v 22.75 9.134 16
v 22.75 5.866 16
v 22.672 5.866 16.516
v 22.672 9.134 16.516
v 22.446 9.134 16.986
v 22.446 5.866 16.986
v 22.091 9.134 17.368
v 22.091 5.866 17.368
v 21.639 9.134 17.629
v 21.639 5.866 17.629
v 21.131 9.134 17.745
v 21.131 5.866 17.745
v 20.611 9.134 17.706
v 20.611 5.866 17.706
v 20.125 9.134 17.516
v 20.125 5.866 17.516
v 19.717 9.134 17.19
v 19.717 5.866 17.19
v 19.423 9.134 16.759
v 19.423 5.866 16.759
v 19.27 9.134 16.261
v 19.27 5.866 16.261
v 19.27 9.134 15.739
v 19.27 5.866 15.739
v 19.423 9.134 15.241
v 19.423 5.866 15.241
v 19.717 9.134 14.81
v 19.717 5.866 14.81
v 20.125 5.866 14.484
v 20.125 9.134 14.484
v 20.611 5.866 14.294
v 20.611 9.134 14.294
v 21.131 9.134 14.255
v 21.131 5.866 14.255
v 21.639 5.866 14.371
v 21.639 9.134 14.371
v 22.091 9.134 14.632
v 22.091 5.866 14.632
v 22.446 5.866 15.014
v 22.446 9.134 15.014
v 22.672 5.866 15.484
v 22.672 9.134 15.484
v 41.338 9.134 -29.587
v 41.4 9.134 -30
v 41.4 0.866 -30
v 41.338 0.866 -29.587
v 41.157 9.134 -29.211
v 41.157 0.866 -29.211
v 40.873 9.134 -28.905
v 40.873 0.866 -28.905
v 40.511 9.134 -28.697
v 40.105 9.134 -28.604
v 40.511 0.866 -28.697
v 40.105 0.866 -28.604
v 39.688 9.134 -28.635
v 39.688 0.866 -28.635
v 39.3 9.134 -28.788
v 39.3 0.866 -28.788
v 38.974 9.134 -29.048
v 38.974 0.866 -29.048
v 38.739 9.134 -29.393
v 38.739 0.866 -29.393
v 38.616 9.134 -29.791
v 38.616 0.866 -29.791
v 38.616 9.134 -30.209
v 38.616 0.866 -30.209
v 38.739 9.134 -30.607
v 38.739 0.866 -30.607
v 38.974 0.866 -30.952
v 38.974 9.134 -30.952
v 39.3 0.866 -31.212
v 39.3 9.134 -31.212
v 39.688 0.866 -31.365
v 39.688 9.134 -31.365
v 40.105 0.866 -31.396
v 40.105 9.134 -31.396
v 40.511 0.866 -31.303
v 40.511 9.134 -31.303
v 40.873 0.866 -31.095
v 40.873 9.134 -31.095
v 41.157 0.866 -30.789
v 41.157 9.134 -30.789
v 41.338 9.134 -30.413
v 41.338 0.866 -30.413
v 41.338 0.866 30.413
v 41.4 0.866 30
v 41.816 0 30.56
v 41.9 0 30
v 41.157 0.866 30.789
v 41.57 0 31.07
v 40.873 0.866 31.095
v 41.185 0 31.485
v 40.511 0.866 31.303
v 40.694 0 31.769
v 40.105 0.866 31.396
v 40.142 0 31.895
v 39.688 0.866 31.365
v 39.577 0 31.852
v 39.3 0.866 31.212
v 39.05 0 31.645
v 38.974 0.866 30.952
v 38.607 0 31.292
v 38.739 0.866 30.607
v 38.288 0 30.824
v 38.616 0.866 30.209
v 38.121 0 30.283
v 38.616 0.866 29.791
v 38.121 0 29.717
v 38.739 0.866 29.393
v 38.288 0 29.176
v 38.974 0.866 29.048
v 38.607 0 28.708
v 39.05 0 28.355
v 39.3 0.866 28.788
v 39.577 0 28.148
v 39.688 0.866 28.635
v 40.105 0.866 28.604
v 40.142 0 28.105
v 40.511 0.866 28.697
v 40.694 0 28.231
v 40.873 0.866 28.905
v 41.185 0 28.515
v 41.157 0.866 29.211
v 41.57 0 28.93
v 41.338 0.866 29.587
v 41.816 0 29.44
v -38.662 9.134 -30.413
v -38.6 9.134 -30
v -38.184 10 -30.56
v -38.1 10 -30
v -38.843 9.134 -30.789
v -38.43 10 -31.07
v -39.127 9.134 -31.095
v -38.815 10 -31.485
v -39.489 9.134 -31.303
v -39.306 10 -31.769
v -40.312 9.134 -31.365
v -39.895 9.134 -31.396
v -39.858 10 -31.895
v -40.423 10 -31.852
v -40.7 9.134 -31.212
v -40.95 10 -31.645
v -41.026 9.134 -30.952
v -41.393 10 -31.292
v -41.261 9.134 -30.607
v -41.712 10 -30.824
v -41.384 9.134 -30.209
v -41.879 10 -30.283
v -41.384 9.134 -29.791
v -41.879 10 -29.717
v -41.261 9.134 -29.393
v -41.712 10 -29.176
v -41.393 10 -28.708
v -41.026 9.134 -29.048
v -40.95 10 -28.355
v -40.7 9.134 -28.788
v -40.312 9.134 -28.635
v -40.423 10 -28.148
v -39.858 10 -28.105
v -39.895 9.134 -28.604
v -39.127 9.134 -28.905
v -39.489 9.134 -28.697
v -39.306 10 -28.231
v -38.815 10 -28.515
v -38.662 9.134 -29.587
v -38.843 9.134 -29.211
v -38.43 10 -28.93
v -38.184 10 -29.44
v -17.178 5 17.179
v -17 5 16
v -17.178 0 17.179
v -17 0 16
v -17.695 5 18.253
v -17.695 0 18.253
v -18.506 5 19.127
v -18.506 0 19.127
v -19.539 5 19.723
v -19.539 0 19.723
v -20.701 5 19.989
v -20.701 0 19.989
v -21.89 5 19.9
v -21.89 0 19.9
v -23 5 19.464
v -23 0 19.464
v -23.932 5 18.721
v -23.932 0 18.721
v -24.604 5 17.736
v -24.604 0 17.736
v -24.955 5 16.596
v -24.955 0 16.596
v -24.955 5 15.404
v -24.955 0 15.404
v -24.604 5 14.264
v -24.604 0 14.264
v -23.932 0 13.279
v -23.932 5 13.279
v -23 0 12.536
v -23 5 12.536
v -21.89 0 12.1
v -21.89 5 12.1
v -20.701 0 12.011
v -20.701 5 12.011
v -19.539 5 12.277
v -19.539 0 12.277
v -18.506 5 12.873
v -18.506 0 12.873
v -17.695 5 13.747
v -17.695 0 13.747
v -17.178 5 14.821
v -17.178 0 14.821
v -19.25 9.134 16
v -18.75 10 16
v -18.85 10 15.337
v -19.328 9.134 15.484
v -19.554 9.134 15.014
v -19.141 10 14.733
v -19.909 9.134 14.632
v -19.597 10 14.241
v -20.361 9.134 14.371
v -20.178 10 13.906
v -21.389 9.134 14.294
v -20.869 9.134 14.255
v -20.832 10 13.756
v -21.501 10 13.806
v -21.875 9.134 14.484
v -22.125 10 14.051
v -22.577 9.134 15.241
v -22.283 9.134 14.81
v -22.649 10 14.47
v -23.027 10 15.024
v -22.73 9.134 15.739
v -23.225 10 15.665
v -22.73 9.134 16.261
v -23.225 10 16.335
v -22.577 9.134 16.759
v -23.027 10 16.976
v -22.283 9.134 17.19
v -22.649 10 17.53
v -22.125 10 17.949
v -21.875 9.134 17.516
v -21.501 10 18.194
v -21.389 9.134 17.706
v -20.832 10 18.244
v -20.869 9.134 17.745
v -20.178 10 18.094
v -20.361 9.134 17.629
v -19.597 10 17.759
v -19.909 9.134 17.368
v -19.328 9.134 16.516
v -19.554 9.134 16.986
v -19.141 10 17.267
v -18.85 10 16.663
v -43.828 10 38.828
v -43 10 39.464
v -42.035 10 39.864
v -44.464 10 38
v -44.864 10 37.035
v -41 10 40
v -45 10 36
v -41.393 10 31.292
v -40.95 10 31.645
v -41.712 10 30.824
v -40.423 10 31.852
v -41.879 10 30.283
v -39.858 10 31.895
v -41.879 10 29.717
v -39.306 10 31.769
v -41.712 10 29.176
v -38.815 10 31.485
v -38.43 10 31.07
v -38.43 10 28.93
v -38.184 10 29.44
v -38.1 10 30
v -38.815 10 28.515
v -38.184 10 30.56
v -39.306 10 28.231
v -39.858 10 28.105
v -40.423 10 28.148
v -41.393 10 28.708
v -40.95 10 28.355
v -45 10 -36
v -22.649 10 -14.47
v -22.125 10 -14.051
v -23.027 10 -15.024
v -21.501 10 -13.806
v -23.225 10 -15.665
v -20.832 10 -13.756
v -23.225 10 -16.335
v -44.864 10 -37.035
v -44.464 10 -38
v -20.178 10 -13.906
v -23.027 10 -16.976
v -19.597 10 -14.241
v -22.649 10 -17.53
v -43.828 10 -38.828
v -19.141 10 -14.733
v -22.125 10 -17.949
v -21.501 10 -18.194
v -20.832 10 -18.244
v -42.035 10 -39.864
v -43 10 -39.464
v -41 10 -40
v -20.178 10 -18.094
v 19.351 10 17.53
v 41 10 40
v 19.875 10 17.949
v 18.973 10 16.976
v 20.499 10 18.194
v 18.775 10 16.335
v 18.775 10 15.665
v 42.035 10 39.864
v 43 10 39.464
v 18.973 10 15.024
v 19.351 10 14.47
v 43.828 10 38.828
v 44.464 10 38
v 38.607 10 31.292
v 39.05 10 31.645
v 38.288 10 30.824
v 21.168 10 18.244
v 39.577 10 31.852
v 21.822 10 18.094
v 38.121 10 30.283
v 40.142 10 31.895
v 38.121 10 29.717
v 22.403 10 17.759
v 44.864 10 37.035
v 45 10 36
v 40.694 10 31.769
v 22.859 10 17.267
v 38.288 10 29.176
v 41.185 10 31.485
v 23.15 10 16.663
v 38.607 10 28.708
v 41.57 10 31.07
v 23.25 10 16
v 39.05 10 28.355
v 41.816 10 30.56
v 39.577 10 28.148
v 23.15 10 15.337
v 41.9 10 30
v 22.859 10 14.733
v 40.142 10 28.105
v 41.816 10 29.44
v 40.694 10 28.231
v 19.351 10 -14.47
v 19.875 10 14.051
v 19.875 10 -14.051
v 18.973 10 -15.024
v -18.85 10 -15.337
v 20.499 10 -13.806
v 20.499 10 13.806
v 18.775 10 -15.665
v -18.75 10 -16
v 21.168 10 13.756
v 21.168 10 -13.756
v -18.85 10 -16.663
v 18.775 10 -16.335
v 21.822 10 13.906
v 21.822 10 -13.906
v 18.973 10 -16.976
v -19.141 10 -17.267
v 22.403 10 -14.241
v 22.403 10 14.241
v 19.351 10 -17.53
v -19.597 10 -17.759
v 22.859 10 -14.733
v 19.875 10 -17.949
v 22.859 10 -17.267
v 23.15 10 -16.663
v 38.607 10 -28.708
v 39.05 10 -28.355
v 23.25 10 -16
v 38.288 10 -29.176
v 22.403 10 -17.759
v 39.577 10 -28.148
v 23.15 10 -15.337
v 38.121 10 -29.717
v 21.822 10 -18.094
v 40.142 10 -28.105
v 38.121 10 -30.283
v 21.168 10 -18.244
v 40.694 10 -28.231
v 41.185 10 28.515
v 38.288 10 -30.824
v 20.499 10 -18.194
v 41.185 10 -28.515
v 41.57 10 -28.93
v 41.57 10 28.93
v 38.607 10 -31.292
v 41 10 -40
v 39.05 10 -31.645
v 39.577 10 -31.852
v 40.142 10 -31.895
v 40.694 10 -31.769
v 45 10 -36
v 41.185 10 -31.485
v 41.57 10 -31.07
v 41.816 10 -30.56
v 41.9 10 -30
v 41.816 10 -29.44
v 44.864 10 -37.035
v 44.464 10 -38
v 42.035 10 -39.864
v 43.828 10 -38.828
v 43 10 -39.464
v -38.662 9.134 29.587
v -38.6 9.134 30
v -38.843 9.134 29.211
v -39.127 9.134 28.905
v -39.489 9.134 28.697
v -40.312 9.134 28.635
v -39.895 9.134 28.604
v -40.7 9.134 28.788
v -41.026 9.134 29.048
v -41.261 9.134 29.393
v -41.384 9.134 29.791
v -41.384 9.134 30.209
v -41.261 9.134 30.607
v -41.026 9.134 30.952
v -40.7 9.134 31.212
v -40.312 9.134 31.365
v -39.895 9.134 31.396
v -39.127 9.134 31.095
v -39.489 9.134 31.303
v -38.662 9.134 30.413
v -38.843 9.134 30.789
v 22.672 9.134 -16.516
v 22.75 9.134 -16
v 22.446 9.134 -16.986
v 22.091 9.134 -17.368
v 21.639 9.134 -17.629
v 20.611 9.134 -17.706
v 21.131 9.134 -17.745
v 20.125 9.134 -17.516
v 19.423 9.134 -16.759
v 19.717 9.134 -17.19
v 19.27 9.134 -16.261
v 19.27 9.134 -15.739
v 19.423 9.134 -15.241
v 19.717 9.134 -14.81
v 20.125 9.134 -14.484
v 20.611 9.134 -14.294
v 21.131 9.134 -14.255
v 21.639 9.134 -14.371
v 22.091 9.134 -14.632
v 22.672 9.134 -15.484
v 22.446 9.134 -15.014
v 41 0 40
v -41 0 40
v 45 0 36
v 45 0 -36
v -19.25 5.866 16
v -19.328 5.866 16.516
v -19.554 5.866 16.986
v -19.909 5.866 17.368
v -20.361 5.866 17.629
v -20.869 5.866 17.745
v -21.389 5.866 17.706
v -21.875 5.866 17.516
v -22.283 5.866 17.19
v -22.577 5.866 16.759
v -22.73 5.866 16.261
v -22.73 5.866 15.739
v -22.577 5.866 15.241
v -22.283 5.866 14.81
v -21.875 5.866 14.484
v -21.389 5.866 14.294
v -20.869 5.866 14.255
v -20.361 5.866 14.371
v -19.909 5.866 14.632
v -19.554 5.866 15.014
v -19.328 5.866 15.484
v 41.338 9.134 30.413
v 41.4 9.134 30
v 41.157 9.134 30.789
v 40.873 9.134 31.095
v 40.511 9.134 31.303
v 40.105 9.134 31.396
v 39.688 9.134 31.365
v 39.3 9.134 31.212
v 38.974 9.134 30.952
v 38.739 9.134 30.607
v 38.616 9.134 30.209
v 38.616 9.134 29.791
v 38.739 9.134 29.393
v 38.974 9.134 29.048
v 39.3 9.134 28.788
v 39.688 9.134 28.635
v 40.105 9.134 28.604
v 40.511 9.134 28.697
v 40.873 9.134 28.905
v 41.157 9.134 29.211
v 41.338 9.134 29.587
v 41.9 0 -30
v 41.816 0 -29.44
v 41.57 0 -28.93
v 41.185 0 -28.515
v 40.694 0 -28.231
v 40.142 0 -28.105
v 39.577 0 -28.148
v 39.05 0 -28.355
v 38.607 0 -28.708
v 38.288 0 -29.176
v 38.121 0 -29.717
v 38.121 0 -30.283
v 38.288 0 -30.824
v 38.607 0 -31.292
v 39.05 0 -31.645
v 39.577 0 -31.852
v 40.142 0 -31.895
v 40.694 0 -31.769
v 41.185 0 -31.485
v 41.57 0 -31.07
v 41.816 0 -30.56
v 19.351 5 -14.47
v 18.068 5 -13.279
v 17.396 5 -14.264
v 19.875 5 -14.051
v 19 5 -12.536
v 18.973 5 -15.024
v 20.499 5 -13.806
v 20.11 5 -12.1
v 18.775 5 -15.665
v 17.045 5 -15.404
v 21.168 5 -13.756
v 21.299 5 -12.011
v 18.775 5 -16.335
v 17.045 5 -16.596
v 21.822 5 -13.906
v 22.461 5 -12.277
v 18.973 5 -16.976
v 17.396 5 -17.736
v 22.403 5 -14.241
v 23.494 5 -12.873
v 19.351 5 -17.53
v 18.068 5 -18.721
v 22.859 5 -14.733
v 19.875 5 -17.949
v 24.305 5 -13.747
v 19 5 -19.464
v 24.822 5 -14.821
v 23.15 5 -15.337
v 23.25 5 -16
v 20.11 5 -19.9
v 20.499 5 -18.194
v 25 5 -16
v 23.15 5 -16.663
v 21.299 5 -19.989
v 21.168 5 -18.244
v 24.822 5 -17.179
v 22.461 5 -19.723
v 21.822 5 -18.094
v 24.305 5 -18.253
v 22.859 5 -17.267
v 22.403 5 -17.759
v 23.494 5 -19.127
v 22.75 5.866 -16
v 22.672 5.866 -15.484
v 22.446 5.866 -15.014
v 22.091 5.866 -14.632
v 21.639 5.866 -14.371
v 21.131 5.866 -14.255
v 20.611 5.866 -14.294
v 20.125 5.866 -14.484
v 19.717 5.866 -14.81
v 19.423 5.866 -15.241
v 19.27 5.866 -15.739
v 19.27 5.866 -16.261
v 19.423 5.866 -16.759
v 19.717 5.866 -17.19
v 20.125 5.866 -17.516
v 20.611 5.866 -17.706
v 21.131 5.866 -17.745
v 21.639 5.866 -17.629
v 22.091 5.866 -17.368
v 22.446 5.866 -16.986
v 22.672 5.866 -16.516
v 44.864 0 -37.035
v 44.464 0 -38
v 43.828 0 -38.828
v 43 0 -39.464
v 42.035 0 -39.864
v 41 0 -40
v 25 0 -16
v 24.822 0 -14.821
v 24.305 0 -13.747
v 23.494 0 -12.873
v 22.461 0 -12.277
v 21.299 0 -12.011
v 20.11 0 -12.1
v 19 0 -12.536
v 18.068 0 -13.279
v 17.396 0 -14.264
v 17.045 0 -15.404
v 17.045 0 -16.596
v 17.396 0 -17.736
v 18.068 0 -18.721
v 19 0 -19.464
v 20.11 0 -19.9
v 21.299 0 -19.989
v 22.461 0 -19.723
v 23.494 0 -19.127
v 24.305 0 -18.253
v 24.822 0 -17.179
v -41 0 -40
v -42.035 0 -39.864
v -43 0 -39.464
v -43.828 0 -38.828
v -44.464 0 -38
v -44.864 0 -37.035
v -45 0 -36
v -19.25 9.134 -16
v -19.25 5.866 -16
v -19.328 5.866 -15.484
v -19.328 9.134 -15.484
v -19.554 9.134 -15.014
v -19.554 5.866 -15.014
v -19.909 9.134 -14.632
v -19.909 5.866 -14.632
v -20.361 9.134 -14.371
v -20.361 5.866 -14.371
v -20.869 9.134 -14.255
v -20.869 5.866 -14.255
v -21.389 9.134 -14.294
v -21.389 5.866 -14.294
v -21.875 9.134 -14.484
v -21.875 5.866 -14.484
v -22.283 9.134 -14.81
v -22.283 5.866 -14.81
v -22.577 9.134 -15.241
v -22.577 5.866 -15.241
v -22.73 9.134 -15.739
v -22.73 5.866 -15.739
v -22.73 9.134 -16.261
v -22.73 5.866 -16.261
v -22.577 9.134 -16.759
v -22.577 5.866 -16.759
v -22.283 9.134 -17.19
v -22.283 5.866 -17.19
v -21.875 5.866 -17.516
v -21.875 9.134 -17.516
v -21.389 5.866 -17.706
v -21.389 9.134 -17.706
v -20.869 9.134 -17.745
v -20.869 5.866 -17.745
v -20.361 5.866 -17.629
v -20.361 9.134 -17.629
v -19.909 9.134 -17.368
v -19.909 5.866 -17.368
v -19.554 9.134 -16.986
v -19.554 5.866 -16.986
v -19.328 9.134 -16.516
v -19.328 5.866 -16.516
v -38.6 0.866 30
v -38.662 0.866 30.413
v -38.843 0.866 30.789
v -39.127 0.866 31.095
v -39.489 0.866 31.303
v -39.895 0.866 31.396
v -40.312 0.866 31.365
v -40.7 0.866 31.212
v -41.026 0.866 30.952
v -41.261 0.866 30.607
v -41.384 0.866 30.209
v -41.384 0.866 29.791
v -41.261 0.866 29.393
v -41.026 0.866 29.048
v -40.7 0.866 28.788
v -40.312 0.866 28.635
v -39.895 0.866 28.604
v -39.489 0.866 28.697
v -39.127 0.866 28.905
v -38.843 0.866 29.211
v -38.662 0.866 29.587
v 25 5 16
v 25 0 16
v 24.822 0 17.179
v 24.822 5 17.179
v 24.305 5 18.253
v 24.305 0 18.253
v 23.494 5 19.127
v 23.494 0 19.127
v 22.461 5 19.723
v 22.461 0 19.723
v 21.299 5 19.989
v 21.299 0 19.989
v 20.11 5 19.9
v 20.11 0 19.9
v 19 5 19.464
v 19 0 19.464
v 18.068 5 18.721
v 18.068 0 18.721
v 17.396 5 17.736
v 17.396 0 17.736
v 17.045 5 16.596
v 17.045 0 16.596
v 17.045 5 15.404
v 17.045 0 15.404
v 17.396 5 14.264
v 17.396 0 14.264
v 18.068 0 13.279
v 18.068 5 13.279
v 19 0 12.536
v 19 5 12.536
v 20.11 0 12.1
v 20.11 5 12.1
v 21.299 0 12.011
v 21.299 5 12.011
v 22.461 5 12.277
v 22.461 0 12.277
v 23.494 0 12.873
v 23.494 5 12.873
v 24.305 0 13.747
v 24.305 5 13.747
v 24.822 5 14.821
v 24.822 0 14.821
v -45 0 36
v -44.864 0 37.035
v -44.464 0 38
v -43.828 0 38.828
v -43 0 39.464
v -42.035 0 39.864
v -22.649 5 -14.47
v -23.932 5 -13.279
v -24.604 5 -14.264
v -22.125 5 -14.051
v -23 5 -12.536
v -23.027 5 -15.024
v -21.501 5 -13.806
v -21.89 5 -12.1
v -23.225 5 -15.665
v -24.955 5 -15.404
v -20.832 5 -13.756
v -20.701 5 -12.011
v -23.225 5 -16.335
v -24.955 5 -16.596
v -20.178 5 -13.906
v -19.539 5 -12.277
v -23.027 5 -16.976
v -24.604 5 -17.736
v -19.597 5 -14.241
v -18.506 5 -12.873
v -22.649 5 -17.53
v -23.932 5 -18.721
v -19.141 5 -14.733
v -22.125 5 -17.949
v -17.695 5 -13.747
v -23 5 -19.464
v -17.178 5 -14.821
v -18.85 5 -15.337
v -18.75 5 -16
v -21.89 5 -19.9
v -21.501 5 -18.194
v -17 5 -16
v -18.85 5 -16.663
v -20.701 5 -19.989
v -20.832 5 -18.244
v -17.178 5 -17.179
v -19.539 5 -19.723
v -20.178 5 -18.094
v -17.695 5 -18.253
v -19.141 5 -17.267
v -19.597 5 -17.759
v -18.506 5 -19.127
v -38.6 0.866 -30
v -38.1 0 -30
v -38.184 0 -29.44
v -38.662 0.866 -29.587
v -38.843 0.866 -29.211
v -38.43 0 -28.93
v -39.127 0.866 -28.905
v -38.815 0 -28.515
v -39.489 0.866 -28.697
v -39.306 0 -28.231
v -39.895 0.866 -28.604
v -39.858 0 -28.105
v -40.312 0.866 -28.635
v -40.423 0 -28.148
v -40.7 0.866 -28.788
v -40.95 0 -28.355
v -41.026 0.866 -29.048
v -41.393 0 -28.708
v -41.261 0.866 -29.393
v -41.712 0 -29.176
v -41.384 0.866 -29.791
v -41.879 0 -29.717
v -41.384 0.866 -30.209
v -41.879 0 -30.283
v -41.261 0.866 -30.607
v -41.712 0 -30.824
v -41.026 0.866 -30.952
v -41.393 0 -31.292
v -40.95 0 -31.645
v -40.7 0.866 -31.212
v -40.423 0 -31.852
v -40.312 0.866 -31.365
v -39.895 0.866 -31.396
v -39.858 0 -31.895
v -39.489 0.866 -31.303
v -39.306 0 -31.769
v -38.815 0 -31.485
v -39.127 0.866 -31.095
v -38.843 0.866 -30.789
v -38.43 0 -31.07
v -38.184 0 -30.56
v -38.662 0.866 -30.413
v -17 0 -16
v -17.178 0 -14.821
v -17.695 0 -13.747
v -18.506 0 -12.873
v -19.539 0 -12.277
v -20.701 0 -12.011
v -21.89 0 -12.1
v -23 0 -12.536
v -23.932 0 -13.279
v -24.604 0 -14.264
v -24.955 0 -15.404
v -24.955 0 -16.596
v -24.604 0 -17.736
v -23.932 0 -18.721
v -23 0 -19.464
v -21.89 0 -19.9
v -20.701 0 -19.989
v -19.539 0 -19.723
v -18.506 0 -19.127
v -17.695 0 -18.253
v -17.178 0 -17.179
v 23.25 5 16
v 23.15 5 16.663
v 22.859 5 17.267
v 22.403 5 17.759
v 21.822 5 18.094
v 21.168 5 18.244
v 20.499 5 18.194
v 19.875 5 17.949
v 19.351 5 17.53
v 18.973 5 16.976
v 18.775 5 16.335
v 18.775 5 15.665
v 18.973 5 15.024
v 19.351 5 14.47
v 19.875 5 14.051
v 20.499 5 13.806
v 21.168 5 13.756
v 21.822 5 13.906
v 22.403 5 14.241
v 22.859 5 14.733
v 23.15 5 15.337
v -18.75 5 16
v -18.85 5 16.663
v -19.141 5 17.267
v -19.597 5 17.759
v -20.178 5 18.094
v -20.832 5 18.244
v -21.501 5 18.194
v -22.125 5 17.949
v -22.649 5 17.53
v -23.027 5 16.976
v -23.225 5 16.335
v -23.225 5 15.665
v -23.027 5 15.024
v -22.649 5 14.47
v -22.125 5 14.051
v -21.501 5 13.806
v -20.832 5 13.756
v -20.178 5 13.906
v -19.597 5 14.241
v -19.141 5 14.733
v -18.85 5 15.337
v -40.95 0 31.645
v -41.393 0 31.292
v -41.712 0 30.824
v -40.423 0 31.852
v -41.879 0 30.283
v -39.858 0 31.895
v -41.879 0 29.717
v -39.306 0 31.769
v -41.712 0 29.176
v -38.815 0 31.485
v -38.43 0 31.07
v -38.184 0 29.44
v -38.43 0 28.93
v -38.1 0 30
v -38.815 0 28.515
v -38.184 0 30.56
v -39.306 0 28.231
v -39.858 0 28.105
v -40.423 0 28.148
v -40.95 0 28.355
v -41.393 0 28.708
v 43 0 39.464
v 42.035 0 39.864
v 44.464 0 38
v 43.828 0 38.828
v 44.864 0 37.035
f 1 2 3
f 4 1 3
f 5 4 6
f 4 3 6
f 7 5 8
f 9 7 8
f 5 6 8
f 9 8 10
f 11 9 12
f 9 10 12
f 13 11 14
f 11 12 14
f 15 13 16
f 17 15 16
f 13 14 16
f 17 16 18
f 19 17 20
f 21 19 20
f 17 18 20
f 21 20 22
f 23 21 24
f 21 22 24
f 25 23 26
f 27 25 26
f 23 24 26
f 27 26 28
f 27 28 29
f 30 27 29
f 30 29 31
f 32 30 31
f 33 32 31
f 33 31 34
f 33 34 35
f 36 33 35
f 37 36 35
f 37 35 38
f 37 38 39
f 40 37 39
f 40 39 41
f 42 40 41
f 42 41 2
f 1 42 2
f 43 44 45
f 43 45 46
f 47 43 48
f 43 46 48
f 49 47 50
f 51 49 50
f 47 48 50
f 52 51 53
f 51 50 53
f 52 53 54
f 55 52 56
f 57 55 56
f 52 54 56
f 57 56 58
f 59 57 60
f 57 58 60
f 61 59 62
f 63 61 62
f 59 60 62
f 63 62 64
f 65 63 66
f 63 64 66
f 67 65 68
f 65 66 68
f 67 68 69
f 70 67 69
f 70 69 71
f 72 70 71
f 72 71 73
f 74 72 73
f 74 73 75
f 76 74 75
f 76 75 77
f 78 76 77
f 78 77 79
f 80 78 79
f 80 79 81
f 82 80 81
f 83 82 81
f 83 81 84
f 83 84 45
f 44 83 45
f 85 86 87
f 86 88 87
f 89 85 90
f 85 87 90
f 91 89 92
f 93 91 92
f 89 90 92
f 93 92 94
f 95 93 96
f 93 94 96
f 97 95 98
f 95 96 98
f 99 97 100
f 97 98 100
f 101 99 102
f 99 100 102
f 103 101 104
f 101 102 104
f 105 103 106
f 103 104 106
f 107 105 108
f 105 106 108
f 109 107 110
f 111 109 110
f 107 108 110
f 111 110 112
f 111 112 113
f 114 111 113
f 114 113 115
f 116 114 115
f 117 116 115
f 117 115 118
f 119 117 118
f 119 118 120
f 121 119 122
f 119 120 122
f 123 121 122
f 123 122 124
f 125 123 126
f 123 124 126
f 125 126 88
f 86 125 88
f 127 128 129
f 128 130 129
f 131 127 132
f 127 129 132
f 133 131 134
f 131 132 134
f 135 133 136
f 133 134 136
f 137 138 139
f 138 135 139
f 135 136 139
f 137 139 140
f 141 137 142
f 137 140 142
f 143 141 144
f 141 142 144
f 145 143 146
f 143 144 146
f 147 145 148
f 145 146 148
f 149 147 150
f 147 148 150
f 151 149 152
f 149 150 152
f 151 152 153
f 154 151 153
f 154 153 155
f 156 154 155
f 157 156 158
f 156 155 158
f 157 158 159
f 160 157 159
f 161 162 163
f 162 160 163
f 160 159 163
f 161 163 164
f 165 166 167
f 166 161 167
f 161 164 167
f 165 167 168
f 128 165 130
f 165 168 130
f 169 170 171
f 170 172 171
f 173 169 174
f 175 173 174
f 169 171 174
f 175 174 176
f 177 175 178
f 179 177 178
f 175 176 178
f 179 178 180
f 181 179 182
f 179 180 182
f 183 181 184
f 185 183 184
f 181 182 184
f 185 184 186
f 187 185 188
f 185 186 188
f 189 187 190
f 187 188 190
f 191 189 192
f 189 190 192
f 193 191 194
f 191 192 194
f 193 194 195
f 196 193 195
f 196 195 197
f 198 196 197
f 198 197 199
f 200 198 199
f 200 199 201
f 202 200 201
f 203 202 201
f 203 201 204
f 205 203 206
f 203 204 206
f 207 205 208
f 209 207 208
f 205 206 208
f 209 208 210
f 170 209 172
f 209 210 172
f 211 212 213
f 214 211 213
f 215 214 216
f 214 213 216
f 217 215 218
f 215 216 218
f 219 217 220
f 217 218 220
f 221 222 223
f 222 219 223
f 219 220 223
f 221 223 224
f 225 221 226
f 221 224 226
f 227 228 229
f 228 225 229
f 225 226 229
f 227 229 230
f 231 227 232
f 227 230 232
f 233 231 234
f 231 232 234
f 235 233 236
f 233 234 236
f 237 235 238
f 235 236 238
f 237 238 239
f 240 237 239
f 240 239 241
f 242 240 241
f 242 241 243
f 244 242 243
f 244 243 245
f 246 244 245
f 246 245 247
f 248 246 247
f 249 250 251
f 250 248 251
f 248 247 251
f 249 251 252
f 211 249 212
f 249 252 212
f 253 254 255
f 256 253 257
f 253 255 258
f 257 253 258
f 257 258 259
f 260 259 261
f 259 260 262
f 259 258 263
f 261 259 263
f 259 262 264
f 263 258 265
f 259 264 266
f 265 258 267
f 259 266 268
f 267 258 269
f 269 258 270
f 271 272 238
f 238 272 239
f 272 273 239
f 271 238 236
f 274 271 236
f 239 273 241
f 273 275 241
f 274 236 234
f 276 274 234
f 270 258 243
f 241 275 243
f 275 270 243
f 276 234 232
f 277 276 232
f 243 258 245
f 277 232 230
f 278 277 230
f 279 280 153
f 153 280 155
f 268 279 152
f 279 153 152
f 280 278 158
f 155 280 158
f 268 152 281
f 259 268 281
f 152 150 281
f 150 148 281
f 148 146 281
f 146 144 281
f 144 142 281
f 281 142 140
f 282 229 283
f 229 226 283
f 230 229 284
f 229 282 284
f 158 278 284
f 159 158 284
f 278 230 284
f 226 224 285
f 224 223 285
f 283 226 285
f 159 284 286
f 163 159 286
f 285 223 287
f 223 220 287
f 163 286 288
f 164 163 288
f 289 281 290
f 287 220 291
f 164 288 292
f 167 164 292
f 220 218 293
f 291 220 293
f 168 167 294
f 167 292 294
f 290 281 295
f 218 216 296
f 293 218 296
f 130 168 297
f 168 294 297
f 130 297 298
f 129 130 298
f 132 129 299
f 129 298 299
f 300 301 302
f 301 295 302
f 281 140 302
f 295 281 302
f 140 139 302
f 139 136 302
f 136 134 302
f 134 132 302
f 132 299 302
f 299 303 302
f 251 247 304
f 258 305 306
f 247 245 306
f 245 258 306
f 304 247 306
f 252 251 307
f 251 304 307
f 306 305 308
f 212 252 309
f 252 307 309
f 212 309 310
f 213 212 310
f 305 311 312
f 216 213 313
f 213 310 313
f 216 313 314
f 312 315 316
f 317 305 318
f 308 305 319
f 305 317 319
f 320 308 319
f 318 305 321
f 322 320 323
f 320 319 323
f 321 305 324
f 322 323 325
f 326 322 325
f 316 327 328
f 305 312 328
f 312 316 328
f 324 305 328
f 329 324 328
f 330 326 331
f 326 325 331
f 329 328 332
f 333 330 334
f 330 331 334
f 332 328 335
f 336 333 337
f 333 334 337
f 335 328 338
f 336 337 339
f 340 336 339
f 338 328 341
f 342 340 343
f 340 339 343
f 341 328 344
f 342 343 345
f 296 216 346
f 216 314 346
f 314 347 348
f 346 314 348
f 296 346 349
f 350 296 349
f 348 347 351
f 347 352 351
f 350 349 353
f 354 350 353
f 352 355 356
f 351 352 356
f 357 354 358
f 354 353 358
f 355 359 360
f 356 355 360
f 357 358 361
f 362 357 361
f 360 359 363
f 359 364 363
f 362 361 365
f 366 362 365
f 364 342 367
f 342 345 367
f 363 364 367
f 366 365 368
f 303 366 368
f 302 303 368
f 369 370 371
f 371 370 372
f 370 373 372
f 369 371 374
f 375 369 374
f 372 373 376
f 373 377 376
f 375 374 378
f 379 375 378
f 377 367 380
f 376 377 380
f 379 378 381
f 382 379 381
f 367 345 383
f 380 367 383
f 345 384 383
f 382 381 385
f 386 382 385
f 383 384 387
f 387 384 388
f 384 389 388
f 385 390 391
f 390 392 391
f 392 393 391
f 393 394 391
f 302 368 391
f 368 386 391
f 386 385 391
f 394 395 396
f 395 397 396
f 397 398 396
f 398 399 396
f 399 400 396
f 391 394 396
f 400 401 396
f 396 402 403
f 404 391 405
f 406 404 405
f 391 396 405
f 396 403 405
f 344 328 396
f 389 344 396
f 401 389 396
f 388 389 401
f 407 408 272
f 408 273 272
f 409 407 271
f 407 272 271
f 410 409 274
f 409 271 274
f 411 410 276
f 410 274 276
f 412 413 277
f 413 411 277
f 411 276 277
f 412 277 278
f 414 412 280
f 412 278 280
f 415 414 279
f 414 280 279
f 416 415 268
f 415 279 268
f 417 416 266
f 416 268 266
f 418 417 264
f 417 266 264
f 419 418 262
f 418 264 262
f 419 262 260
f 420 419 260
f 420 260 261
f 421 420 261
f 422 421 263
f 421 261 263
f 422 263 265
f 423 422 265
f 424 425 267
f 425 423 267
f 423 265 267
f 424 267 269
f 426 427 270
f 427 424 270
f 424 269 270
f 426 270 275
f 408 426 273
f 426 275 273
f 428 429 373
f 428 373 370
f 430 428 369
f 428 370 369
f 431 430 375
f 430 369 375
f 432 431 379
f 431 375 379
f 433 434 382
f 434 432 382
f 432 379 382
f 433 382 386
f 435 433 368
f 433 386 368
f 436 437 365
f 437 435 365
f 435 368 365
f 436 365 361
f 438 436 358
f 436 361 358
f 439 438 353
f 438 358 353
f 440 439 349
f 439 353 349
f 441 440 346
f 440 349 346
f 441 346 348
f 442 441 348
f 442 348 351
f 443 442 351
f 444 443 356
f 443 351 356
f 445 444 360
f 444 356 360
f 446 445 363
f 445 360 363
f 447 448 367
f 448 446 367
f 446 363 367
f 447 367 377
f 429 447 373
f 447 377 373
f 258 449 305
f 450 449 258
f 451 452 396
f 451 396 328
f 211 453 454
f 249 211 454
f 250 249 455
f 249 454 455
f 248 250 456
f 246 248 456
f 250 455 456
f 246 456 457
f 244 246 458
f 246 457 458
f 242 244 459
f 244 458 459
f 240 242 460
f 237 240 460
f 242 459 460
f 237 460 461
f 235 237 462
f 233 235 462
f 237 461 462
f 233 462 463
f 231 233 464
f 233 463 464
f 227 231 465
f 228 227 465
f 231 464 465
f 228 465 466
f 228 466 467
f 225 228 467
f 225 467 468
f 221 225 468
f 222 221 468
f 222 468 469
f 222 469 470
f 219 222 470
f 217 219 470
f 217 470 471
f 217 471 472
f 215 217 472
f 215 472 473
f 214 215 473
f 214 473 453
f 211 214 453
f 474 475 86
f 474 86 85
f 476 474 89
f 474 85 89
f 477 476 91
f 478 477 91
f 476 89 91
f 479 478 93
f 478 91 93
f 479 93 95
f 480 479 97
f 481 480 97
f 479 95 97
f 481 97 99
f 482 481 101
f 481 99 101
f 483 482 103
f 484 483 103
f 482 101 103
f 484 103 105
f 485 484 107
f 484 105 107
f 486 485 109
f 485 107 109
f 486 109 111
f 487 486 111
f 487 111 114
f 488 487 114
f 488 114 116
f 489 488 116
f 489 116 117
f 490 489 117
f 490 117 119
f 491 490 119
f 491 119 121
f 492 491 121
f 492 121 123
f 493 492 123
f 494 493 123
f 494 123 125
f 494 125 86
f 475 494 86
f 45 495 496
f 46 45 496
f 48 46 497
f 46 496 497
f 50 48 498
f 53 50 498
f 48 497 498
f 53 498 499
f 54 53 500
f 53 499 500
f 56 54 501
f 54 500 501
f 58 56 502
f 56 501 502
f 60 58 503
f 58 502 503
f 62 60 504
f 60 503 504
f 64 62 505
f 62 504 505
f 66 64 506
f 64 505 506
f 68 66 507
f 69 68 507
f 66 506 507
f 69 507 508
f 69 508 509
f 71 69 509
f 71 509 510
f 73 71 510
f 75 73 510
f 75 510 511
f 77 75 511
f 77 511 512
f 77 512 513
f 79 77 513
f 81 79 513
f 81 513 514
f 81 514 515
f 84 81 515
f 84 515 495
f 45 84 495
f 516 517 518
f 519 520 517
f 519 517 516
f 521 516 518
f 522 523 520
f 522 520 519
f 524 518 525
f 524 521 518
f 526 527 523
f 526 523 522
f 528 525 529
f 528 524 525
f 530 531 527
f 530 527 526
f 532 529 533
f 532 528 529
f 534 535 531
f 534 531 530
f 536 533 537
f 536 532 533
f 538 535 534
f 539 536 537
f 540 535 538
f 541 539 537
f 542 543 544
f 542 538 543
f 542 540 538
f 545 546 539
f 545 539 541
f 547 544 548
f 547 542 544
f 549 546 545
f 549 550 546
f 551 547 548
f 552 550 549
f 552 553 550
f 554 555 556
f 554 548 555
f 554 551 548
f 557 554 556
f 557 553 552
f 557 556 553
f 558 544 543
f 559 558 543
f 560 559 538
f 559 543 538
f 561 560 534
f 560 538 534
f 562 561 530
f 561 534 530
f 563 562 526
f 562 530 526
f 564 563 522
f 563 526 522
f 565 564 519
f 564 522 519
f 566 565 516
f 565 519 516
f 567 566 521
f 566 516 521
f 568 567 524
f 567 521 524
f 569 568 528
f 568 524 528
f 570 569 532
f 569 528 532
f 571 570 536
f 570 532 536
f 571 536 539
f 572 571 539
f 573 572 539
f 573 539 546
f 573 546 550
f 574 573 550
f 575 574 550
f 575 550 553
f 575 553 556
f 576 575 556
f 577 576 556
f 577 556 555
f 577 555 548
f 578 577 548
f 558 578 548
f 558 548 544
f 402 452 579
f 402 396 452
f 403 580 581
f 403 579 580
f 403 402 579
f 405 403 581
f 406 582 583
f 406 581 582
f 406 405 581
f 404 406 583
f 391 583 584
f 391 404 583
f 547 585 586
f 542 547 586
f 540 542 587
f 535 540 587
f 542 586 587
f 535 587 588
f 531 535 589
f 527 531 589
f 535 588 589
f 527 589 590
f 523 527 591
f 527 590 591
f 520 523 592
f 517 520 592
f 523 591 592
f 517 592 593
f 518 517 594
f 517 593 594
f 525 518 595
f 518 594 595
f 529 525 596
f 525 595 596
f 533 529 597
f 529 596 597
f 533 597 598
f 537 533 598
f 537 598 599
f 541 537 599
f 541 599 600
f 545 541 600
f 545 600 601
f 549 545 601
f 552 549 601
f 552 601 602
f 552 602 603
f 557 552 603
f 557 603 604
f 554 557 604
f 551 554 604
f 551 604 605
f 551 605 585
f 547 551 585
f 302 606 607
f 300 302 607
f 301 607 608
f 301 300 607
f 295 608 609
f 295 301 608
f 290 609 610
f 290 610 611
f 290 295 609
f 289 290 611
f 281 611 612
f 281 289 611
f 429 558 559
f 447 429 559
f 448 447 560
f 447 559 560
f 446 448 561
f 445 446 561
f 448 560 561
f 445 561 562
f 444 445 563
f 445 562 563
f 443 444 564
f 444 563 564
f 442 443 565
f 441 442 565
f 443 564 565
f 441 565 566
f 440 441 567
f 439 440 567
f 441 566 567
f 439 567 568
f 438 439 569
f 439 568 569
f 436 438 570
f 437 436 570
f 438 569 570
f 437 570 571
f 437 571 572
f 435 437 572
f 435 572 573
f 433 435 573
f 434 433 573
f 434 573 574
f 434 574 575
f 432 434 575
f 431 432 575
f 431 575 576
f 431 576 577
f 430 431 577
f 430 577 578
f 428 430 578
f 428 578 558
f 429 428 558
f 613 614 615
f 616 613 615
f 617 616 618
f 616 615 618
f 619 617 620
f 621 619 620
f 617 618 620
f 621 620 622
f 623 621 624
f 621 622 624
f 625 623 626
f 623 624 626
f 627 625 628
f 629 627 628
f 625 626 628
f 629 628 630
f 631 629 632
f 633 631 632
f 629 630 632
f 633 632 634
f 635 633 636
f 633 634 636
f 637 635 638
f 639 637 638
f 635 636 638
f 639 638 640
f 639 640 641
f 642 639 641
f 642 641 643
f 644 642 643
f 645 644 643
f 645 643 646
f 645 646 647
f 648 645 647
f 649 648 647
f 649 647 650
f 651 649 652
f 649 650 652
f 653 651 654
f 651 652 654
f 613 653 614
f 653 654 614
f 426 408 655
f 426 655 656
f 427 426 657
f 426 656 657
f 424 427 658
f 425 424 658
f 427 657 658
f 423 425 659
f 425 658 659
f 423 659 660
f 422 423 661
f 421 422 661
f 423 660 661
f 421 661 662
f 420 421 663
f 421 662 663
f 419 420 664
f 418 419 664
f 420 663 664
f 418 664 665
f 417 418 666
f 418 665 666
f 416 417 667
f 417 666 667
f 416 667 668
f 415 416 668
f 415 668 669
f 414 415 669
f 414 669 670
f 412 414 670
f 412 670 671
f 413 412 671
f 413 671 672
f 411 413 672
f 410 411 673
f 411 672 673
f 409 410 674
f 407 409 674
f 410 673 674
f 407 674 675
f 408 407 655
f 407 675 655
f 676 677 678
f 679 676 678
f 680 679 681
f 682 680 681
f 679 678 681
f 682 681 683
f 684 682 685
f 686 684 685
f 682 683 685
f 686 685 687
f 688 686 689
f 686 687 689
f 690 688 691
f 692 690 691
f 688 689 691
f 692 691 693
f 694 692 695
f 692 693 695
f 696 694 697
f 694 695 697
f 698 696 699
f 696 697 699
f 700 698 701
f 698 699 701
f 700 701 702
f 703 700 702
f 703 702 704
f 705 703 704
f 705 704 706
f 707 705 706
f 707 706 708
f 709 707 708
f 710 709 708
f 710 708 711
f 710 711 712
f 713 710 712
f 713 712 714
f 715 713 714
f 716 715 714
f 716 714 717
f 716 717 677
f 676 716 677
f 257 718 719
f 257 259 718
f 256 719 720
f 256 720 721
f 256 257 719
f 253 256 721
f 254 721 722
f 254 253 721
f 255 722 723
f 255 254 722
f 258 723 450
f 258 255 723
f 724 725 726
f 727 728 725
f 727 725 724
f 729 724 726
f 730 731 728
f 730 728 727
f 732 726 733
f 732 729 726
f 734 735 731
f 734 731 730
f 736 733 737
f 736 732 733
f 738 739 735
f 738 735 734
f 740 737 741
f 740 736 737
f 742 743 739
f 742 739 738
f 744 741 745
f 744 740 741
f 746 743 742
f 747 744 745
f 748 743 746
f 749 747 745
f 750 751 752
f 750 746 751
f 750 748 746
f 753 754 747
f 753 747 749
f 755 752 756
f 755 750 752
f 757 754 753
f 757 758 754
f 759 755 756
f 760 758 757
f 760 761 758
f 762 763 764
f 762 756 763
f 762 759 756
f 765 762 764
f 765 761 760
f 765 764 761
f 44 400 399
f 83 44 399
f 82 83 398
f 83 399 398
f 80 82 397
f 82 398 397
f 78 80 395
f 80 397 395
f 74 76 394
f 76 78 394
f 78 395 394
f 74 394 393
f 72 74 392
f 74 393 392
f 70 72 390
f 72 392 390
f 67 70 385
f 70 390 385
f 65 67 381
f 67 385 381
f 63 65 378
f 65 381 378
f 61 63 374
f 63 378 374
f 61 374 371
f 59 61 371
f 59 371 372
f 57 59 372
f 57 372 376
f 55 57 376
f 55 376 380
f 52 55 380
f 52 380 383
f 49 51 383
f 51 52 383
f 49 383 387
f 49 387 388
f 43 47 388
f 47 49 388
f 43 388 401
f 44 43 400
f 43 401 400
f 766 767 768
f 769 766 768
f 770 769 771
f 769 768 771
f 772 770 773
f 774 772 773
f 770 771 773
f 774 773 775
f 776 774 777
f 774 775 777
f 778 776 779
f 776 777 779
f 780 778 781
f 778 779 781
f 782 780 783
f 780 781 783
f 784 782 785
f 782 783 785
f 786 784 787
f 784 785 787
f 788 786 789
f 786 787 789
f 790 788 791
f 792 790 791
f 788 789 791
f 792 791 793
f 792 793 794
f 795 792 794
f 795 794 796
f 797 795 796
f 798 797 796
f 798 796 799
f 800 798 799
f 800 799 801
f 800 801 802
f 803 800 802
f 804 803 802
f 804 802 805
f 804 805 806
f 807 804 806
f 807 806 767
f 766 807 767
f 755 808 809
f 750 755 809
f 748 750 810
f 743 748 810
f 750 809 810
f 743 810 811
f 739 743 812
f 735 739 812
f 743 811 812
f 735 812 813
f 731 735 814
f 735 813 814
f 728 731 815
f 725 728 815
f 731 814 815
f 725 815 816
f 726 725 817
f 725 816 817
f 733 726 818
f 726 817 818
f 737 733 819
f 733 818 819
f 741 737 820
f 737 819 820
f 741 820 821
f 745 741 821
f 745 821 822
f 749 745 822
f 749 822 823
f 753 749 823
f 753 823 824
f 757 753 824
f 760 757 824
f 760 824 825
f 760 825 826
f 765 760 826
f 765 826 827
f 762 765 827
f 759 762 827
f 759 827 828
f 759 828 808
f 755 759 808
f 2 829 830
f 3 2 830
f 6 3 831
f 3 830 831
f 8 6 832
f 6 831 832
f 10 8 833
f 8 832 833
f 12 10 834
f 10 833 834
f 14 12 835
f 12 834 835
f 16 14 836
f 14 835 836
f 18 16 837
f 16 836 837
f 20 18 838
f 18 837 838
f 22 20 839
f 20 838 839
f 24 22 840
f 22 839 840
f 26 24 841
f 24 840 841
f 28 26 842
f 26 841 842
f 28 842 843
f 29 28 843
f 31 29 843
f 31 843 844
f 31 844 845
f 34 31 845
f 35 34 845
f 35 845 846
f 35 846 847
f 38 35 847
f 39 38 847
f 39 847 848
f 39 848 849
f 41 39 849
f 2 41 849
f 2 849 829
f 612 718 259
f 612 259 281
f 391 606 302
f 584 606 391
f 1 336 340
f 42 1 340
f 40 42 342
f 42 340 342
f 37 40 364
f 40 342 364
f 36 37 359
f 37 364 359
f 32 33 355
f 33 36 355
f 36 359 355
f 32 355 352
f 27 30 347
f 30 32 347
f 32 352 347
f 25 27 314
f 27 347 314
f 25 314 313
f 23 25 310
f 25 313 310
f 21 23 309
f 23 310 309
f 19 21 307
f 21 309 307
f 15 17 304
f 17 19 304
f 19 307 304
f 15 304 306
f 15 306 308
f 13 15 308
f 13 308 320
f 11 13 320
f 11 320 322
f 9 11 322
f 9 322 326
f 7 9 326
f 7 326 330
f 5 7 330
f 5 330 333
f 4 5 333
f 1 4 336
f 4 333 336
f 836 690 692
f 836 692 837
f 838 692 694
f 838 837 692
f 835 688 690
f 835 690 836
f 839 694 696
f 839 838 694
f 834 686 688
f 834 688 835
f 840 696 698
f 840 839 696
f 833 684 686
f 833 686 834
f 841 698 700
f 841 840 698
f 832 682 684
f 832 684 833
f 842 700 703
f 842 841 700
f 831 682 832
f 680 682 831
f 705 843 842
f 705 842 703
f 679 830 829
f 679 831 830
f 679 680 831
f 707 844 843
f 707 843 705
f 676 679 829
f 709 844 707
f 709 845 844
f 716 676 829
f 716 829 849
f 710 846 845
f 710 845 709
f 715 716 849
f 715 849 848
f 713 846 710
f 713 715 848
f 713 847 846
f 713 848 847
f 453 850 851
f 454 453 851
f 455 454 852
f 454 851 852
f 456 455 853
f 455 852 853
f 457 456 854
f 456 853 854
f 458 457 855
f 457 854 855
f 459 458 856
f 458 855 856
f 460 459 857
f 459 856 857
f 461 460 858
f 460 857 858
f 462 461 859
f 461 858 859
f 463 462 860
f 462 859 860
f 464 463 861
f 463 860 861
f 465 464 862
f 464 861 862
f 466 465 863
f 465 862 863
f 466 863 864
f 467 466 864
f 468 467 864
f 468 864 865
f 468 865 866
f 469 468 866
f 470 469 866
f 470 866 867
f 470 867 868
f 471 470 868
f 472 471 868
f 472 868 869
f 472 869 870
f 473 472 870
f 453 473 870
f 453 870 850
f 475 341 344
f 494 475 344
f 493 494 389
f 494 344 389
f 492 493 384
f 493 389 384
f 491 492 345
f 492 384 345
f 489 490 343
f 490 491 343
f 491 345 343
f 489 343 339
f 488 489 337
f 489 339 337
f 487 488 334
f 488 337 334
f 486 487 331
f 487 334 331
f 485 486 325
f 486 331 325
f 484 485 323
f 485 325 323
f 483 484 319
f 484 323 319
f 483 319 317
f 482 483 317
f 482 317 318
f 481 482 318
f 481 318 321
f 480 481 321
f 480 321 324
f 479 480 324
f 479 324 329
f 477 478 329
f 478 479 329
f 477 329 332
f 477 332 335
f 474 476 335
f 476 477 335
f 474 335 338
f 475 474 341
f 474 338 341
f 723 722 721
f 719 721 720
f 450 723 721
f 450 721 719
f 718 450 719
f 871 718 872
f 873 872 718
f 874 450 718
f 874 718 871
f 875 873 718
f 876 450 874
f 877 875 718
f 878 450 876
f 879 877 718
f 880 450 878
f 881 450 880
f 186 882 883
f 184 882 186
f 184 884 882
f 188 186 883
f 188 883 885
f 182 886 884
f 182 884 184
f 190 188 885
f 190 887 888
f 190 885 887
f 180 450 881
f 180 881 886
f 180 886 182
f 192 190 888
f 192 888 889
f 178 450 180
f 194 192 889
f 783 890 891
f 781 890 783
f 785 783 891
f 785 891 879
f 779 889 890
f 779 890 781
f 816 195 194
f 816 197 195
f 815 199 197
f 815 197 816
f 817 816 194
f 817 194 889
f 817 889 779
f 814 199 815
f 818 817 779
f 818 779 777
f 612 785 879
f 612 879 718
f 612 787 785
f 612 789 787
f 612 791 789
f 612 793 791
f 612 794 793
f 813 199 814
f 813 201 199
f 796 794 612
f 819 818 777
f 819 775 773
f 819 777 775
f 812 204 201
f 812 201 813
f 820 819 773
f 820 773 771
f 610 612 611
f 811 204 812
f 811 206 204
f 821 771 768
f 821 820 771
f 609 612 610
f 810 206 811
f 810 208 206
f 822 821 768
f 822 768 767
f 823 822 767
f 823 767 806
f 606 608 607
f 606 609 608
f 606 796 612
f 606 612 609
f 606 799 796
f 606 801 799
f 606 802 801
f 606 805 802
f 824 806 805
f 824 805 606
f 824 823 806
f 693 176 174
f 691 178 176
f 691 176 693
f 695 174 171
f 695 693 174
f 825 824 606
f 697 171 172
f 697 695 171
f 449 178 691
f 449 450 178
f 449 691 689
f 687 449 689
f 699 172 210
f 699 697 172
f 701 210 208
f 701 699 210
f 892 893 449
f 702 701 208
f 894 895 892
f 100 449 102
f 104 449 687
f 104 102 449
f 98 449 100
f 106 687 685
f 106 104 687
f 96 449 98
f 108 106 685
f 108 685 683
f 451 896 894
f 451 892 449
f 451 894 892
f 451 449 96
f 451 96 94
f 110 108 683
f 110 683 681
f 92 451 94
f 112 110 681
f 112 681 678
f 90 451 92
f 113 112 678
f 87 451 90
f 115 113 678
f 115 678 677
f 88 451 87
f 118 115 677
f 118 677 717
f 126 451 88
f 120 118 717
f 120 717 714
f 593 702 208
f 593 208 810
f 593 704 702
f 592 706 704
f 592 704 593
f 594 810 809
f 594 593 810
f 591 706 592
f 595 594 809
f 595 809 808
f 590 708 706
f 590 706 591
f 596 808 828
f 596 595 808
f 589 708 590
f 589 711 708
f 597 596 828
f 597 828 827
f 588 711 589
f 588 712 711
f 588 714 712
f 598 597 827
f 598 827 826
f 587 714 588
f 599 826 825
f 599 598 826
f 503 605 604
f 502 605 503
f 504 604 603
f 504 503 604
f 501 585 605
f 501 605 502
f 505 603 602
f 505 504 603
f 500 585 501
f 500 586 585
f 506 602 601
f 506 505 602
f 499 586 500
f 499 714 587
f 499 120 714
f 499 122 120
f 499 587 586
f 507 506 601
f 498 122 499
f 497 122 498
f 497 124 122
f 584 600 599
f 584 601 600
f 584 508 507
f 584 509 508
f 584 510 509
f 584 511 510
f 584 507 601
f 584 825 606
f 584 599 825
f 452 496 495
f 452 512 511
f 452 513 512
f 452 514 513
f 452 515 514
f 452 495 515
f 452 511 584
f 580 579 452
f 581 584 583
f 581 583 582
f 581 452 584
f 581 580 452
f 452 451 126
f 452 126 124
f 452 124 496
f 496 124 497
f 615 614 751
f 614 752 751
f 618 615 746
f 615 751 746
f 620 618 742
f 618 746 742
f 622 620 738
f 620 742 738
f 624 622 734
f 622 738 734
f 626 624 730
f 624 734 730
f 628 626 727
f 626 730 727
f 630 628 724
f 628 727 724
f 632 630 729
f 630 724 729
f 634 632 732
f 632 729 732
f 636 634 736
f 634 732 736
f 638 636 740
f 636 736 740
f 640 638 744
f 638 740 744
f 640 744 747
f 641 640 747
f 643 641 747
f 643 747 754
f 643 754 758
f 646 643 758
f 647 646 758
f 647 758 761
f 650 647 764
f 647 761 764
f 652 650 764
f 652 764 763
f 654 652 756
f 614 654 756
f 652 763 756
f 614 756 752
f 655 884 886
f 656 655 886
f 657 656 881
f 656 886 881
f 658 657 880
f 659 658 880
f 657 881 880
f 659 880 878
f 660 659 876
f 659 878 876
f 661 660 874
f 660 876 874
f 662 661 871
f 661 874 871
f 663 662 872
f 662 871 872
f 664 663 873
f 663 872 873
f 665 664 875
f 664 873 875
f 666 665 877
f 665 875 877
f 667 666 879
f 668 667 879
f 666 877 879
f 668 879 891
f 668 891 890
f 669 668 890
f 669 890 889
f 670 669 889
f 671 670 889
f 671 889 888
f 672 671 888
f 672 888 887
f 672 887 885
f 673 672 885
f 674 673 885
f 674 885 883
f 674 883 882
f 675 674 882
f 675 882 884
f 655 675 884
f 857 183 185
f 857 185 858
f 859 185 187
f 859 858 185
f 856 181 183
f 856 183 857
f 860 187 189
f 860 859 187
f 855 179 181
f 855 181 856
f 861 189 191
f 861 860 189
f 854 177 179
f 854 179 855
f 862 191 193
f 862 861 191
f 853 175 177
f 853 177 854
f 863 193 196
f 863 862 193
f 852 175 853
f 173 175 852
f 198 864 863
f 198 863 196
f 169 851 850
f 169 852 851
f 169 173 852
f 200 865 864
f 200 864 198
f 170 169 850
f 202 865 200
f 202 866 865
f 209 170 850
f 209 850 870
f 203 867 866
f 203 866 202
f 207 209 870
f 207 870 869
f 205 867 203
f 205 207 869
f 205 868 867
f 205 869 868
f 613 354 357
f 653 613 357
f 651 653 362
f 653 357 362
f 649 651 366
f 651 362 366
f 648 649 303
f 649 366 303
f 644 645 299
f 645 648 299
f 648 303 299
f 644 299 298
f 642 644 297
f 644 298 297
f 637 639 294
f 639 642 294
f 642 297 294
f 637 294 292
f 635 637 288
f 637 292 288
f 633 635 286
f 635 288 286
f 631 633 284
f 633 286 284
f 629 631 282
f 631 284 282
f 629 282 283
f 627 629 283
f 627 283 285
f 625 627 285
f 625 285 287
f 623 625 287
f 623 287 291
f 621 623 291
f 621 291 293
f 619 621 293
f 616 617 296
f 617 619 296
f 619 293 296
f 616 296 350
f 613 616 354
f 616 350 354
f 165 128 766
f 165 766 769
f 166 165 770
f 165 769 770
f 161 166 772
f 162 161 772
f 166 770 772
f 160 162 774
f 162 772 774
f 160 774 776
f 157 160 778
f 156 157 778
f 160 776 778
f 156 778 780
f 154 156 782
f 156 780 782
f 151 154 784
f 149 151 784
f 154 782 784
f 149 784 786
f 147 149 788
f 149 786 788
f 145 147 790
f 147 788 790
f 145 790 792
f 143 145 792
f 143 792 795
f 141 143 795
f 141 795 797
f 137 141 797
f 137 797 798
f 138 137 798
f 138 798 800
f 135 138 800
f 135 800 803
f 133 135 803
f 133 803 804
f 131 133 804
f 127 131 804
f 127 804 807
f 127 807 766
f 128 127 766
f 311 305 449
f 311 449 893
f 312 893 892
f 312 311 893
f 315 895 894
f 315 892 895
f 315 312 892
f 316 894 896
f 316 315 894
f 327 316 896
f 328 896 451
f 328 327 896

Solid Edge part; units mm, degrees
sketch "Sketch1" plane through (0, 0, 0) normal (0, -1, 0) x (1, 0, 0)
  line L0 (-45, -40) -> (45, -40)
  line L1 (45, -40) -> (45, 40)
  line L2 (45, 40) -> (-45, 40)
  line L3 (-45, 40) -> (-45, -40)
  dimension "D1" = 90
  dimension "D2" = 80
extrude "Protrusion1" add sketch "Sketch1" against normal blind 10
sketch "Sketch2" plane through (0, 0, 0) normal (0, -1, 0) x (1, 0, 0)
  circle A0 centre (-40, 30) radius 1.4
  circle A1 centre (-40, -30) radius 1.4
  circle A2 centre (40, -30) radius 1.4
  circle A3 centre (40, 30) radius 1.4
  dimension "D1" = 2.8
  dimension "D2" = 60
  dimension "D3" = 80
extrude "Cutout1" cut sketch "Sketch2" against normal through all
sketch "Sketch3" plane through (0, 0, 0) normal (0, -1, 0) x (1, 0, 0)
  circle A0 centre (-21, 16) radius 4
  circle A1 centre (-21, -16) radius 4
  circle A2 centre (21, -16) radius 4
  circle A3 centre (21, 16) radius 4
extrude "Extrusionsausschnitt_2" cut sketch "Sketch3" against normal blind 5
sketch "Sketch4" plane through (0, 0, 0) normal (0, -1, 0) x (1, 0, 0)
  circle A0 centre (-21, 16) radius 1.75
  circle A1 centre (-21, -16) radius 1.75
  circle A2 centre (21, -16) radius 1.75
  circle A3 centre (21, 16) radius 1.75
  dimension "D1" = 3.5
extrude "Cutout2" cut sketch "Sketch4" against normal through all
fillet "Verrundung_1" radius 4 4 edges at (-45, 5, 40) (45, 5, 40) (45, 5, -40) (-45, 5, -40)
chamfer "Fase_1" distance 0.5 angle 60 4 edges at (38.6, 0, 30) (-41.4, 0, 30) (-41.4, 0, -30) (38.6, 0, -30) measured on face at (-29.1, 0, 27.4667)
chamfer "Fase_2" distance 0.5 angle 60 4 edges at (-40, 10, 31.4) (40, 10, 31.4) (40, 10, -28.6) (-40, 10, -28.6) measured on face at (-29.1, 10, 27.4667)
chamfer "Fase_3" distance 0.5 angle 60 4 edges at (-21, 10, 17.75) (21, 10, 17.75) (-21, 10, -14.25) (21, 10, -14.25) measured on face at (-29.1, 10, 27.4667)
chamfer "Fase_4" distance 0.5 angle 60 4 edges at (-21, 5, 14.25) (-21, 5, -17.75) (21, 5, 14.25) (21, 5, -17.75) measured on face at (-23.5867, 5, 18.7467) measured on face at (18.4133, 5, 18.7467) measured on face at (-23.5867, 5, -13.2533) measured on face at (18.4133, 5, -13.2533)
properties material "Nylon, allgemein"
